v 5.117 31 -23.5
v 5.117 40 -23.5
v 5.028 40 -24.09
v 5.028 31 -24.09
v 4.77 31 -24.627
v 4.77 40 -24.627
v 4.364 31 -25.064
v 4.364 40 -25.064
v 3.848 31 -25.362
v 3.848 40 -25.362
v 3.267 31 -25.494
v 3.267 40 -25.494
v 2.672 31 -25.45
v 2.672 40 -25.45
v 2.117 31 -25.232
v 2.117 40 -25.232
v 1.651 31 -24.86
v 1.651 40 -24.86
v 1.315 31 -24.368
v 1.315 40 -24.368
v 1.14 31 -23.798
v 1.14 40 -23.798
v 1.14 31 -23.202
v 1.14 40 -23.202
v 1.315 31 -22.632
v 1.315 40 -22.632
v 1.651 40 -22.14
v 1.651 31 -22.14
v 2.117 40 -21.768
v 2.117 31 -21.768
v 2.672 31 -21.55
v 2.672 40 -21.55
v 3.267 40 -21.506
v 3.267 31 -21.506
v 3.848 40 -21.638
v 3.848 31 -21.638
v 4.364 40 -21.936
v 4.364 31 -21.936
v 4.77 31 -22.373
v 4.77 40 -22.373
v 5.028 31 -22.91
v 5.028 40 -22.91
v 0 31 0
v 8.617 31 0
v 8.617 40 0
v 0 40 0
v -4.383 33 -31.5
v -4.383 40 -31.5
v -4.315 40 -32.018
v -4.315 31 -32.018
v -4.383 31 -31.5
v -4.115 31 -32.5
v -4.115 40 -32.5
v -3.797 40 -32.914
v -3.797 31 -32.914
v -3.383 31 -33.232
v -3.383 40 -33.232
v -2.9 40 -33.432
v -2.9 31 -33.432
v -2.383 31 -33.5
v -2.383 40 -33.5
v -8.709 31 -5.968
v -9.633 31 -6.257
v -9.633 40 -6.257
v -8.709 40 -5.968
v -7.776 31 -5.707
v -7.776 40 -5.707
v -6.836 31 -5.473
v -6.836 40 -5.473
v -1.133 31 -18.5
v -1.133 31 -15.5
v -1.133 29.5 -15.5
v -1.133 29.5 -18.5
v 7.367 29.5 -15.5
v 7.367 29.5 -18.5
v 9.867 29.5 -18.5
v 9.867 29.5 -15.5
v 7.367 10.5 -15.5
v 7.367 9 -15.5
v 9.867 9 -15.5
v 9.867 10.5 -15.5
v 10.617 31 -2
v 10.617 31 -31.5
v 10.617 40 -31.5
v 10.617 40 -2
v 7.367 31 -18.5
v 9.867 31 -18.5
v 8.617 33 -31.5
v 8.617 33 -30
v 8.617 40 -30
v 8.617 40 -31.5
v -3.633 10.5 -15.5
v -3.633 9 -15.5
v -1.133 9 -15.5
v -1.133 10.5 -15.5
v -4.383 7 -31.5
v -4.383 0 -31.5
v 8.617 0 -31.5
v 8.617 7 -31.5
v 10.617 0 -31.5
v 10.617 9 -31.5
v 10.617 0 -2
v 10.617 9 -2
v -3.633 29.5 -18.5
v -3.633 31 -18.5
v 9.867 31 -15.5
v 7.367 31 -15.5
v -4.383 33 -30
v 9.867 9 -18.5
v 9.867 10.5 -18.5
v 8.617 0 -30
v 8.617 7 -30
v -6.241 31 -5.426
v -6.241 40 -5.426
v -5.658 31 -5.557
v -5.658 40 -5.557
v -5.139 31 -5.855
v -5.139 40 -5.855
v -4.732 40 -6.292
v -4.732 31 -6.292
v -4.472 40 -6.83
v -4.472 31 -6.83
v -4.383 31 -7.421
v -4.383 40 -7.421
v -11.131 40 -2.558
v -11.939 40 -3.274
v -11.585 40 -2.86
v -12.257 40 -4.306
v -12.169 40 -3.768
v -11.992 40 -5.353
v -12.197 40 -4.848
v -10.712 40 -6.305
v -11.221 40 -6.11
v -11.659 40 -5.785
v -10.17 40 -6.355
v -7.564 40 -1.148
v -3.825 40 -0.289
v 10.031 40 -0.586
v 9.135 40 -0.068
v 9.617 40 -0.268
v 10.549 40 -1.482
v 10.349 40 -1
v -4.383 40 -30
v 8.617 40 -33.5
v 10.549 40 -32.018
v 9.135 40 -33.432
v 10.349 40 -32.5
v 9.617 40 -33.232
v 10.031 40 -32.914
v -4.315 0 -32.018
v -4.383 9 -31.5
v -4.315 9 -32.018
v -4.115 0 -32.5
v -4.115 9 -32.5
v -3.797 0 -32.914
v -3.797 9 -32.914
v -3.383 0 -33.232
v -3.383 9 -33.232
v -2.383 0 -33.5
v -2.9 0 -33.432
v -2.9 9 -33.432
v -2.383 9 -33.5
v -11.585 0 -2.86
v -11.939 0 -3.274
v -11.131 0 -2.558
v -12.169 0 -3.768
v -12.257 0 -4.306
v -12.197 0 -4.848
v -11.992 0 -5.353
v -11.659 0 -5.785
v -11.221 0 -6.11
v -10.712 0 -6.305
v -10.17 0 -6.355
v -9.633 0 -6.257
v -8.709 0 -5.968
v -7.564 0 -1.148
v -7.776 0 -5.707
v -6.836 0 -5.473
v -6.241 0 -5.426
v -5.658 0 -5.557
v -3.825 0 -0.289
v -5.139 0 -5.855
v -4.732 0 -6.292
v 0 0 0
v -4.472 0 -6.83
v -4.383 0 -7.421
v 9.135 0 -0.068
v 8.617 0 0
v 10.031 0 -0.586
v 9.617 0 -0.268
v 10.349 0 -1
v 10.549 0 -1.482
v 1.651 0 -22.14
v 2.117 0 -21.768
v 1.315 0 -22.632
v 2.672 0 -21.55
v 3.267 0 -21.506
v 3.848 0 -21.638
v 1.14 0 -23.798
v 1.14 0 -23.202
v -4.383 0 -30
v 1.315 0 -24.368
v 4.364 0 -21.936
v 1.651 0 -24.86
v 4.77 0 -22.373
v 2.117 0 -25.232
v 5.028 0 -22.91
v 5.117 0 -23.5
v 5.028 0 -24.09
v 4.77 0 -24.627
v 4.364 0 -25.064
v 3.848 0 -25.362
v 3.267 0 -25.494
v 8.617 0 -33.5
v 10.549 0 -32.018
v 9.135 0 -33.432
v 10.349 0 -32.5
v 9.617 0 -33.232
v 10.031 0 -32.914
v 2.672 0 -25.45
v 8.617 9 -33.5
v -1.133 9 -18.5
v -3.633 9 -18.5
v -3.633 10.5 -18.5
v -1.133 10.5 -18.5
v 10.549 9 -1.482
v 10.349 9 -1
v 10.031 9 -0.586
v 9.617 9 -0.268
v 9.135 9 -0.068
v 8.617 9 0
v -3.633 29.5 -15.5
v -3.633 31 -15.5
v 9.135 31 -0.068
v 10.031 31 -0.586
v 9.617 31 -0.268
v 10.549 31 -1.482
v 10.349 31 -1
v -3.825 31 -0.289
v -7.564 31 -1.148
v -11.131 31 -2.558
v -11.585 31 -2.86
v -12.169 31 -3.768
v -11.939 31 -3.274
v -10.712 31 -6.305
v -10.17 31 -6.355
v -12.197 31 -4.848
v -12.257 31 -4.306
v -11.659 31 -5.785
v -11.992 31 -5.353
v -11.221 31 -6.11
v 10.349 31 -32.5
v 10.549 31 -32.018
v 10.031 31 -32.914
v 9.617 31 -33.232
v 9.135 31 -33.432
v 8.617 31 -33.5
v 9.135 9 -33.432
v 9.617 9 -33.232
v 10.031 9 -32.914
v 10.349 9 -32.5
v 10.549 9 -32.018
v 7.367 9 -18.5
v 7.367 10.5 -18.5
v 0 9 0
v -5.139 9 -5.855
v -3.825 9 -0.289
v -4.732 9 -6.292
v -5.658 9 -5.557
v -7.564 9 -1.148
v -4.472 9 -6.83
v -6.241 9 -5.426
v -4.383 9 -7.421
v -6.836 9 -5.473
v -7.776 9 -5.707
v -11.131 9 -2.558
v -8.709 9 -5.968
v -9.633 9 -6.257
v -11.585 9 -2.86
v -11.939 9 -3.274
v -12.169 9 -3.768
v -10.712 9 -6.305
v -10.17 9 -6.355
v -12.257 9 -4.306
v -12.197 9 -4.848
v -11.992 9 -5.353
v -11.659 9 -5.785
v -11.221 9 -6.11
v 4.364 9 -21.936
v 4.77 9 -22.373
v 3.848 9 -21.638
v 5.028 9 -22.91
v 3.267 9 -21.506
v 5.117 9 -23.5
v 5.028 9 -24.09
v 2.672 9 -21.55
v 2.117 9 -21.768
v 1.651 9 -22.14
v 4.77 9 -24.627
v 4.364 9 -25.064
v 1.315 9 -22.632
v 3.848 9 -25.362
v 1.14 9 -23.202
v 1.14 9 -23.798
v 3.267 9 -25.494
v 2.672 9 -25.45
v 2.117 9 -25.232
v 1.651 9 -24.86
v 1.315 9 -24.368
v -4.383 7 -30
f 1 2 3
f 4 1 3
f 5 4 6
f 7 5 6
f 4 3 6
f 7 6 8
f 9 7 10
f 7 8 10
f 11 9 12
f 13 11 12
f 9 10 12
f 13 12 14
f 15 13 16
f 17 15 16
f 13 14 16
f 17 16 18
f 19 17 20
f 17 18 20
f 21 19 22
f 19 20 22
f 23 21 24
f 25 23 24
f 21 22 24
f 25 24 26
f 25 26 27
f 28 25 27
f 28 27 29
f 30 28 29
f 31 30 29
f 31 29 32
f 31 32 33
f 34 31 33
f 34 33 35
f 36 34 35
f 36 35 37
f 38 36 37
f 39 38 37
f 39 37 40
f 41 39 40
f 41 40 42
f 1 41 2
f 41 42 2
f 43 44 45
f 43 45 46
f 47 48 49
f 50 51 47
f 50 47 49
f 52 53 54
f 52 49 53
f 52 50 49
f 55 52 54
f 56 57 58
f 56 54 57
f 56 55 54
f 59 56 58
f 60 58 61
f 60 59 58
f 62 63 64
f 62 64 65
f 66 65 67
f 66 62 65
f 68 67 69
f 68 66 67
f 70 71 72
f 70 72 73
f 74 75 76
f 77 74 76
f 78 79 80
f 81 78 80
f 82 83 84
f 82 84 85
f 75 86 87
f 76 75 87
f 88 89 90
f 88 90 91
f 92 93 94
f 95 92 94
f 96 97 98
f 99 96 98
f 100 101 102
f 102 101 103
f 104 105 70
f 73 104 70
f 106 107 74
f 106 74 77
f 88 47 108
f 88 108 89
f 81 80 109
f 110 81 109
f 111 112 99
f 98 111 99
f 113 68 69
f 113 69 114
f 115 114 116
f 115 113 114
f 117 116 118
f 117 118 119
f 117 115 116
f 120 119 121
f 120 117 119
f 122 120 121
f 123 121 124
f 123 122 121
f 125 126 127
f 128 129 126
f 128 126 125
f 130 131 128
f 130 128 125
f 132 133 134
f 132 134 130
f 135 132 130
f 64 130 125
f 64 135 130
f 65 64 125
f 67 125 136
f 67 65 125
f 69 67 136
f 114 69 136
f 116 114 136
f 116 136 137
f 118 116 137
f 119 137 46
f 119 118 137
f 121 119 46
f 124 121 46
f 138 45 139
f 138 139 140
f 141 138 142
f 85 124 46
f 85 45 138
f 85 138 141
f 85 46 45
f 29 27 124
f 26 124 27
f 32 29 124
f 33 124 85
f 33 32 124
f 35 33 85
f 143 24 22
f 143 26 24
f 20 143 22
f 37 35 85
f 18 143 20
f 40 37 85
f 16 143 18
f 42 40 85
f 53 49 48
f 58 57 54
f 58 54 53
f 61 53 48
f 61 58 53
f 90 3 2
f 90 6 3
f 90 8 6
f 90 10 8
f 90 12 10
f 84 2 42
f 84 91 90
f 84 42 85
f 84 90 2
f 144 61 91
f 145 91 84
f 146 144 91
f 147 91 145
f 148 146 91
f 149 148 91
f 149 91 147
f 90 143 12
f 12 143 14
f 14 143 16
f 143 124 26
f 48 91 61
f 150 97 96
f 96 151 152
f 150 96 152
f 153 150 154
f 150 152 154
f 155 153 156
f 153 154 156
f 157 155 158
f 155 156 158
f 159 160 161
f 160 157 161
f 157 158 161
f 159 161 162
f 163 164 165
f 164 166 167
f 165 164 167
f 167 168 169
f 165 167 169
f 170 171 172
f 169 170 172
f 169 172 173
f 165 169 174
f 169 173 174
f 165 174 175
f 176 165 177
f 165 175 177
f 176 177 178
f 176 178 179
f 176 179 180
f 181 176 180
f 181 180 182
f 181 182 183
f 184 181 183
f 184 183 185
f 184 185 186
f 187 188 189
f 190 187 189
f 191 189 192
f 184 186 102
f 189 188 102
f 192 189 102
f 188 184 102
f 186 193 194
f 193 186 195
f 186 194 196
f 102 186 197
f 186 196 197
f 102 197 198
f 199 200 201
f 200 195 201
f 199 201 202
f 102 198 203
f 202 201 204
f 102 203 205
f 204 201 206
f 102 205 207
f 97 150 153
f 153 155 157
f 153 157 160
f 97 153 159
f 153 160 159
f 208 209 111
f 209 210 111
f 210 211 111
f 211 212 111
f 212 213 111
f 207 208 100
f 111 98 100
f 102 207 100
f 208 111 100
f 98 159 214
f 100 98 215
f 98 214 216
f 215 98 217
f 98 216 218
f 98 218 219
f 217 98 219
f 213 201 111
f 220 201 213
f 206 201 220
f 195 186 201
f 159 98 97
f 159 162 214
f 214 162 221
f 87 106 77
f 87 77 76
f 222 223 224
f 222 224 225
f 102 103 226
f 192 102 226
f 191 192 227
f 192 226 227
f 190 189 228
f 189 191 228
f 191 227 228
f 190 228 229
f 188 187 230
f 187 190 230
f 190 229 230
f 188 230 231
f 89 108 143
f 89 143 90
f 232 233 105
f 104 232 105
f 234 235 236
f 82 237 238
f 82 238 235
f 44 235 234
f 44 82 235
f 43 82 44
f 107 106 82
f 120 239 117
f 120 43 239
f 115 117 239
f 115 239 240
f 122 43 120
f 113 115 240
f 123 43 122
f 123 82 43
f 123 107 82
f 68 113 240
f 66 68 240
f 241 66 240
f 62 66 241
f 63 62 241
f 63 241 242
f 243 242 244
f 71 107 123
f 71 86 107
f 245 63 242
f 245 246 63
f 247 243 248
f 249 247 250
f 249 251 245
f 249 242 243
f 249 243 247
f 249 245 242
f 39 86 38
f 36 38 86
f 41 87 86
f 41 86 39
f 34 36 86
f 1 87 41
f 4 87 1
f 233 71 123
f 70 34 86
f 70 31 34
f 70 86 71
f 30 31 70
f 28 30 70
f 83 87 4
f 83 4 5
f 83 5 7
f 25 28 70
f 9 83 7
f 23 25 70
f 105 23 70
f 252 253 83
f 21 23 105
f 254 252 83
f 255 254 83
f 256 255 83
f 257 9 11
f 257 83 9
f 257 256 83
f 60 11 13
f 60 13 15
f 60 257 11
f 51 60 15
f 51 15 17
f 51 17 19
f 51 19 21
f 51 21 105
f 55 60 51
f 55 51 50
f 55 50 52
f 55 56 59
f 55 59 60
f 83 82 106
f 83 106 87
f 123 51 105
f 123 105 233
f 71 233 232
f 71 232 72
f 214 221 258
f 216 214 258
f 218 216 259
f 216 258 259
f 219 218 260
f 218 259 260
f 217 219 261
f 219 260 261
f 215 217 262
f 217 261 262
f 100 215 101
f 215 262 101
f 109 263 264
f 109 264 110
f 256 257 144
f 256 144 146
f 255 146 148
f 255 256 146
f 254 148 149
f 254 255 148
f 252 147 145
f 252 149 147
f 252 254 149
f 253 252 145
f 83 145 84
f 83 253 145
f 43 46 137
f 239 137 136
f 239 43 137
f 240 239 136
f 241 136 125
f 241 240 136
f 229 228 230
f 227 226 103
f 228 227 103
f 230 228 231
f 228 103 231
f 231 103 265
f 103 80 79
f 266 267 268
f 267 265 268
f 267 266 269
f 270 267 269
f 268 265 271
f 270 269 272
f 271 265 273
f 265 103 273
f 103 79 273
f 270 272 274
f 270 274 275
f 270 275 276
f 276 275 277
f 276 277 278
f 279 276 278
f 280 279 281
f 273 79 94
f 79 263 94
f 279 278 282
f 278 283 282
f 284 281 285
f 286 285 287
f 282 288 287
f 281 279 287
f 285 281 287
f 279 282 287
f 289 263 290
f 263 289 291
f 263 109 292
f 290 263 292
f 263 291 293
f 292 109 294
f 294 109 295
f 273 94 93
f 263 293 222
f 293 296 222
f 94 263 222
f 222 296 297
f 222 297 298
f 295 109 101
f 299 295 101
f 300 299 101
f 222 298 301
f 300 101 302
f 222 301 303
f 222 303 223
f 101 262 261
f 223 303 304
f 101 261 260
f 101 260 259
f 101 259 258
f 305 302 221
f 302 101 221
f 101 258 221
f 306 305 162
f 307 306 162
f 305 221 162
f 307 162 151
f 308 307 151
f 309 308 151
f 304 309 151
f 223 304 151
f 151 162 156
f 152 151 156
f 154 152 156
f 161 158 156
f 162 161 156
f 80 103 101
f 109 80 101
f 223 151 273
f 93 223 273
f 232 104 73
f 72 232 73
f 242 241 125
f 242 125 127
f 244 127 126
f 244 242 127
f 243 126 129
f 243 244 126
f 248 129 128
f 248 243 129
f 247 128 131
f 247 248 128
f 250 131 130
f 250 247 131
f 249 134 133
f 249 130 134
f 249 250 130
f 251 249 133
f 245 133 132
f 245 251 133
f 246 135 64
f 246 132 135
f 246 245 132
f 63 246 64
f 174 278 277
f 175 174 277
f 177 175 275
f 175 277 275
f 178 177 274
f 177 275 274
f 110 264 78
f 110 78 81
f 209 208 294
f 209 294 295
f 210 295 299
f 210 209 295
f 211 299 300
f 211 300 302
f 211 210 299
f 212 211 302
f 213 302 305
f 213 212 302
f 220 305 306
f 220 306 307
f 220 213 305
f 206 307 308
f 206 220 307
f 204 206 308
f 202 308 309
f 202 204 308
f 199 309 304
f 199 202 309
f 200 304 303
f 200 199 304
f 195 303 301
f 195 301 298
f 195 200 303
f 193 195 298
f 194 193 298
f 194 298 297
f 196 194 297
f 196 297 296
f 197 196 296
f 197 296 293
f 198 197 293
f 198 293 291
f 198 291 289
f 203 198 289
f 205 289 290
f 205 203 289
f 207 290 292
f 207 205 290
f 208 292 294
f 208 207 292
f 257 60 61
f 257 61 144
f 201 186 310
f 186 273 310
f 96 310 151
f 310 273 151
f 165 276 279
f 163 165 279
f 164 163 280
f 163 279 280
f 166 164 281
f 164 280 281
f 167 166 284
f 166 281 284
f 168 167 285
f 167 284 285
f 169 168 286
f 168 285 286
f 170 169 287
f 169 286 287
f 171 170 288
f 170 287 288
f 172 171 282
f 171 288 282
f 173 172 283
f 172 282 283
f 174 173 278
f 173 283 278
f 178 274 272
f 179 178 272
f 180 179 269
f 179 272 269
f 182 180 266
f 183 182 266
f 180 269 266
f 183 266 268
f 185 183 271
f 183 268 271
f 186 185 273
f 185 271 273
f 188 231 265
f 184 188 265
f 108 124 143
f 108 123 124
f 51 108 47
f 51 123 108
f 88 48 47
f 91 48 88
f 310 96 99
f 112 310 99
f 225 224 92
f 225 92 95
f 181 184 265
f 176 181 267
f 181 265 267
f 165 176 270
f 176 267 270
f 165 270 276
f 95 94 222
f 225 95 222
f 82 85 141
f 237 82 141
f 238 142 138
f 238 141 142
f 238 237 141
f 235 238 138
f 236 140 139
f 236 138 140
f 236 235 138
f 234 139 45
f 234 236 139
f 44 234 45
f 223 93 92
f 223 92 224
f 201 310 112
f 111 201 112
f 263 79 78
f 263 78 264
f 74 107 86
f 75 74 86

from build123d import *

# Parameters (mm, degrees)
SKETCH_1_R          = 2
EXTRUDE_1_DEPTH     = 9
SKETCH_3_W          = 2.5
SKETCH_3_H          = 3
EXTRUDE_2_DEPTH     = 1.5
CUT_EXTRUDE_1_REACH = 13
CUT_EXTRUDE_START   = -2
SKETCH_5_W          = 13
SKETCH_5_H          = 1.5
SKETCH_9_W          = 49.545975543
SKETCH_9_H          = 42.208236046
CUT_EXTRUDE_2_DEPTH = 11.5


with BuildPart() as part:
    # 草图1 → 凸台-拉伸1 (new body)
    with BuildSketch(Plane(origin=(0, 0, 0), x_dir=(1, 0, 0), z_dir=(0, 1, 0))):
        with BuildLine():
            Line((-2.382835885, 33.5), (8.617164115, 33.5))
            ThreePointArc((8.617164115, 33.5), (10.031377677, 32.914213562), (10.617164115, 31.5))
            Line((10.617164115, 31.5), (10.617164115, 2))
            ThreePointArc((10.617164115, 2), (10.031377677, 0.585786438), (8.617164115, 0))
            Line((8.617164115, 0), (0, 0))
            ThreePointArc((0, 0), (-5.710600422, 0.647655185), (-11.131122415, 2.557722132))
            ThreePointArc((-11.131122415, 2.557722132), (-12.111898361, 5.107720531), (-9.633282348, 6.257014206))
            ThreePointArc((-9.633282348, 6.257014206), (-8.243555708, 5.833986106), (-6.836394497, 5.473167269))
            ThreePointArc((-6.836394497, 5.473167269), (-5.139275919, 5.854675685), (-4.382835885, 7.421059613))
            Line((-4.382835885, 7.421059613), (-4.382835885, 31.5))
            ThreePointArc((-4.382835885, 31.5), (-3.797049447, 32.914213562), (-2.382835885, 33.5))
        make_face()
        with Locations((3.117164115, 23.5)):
            Circle(SKETCH_1_R, mode=Mode.SUBTRACT)
    extrude(amount=EXTRUDE_1_DEPTH)

    # 草图3 → 凸台-拉伸2 (add)
    with BuildSketch(Plane(origin=(0, 9, 0), x_dir=(1, 0, 0), z_dir=(0, 1, 0))):
        with Locations((-2.382835885, 17)):
            Rectangle(SKETCH_3_W, SKETCH_3_H)
        with Locations((8.617164115, 17)):
            Rectangle(SKETCH_3_W, SKETCH_3_H)
    extrude(amount=EXTRUDE_2_DEPTH)

    # 草图5 → 切除-拉伸1 (cut, up to next)
    with BuildSketch(Plane(origin=(0, 9, 0), x_dir=(1, 0, 0), z_dir=(0, 1, 0)).offset(CUT_EXTRUDE_START), mode=Mode.PRIVATE) as cut_extrude_1_sk1:
        with Locations((2.117164115, 30.75)):
            Rectangle(SKETCH_5_W, SKETCH_5_H)
    cut_extrude_1_tool1 = extrude(cut_extrude_1_sk1.sketch, amount=-CUT_EXTRUDE_1_REACH, mode=Mode.PRIVATE) & part.part
    add(cut_extrude_1_tool1.solids().sort_by_distance((2.117164, 7, -30.75))[0], mode=Mode.SUBTRACT)

    # 镜向8: part across plane


with BuildPart() as part_1:
    add(part.part)
    add(part.part.mirror(Plane(origin=(0, 0, -25.5), x_dir=(0, 0, 1), z_dir=(0, -1, 0))))

    # 草图9 → 切除-拉伸2 (cut, through all)
    with BuildSketch(Plane(origin=(0, 0, 0), x_dir=(1, 0, 0), z_dir=(0, 1, 0))):
        with Locations((0.218507418, 15.905835279)):
            Rectangle(SKETCH_9_W, SKETCH_9_H)
    extrude(amount=-CUT_EXTRUDE_2_DEPTH, mode=Mode.SUBTRACT)


with BuildPart() as body_2:
    # 镜向11: mirrored copy
    add(part_1.part.mirror(Plane(origin=(0, 20, 0), x_dir=(0, 0, 1), z_dir=(0, -1, 0))))


solid = Compound([part_1.part, body_2.part])
